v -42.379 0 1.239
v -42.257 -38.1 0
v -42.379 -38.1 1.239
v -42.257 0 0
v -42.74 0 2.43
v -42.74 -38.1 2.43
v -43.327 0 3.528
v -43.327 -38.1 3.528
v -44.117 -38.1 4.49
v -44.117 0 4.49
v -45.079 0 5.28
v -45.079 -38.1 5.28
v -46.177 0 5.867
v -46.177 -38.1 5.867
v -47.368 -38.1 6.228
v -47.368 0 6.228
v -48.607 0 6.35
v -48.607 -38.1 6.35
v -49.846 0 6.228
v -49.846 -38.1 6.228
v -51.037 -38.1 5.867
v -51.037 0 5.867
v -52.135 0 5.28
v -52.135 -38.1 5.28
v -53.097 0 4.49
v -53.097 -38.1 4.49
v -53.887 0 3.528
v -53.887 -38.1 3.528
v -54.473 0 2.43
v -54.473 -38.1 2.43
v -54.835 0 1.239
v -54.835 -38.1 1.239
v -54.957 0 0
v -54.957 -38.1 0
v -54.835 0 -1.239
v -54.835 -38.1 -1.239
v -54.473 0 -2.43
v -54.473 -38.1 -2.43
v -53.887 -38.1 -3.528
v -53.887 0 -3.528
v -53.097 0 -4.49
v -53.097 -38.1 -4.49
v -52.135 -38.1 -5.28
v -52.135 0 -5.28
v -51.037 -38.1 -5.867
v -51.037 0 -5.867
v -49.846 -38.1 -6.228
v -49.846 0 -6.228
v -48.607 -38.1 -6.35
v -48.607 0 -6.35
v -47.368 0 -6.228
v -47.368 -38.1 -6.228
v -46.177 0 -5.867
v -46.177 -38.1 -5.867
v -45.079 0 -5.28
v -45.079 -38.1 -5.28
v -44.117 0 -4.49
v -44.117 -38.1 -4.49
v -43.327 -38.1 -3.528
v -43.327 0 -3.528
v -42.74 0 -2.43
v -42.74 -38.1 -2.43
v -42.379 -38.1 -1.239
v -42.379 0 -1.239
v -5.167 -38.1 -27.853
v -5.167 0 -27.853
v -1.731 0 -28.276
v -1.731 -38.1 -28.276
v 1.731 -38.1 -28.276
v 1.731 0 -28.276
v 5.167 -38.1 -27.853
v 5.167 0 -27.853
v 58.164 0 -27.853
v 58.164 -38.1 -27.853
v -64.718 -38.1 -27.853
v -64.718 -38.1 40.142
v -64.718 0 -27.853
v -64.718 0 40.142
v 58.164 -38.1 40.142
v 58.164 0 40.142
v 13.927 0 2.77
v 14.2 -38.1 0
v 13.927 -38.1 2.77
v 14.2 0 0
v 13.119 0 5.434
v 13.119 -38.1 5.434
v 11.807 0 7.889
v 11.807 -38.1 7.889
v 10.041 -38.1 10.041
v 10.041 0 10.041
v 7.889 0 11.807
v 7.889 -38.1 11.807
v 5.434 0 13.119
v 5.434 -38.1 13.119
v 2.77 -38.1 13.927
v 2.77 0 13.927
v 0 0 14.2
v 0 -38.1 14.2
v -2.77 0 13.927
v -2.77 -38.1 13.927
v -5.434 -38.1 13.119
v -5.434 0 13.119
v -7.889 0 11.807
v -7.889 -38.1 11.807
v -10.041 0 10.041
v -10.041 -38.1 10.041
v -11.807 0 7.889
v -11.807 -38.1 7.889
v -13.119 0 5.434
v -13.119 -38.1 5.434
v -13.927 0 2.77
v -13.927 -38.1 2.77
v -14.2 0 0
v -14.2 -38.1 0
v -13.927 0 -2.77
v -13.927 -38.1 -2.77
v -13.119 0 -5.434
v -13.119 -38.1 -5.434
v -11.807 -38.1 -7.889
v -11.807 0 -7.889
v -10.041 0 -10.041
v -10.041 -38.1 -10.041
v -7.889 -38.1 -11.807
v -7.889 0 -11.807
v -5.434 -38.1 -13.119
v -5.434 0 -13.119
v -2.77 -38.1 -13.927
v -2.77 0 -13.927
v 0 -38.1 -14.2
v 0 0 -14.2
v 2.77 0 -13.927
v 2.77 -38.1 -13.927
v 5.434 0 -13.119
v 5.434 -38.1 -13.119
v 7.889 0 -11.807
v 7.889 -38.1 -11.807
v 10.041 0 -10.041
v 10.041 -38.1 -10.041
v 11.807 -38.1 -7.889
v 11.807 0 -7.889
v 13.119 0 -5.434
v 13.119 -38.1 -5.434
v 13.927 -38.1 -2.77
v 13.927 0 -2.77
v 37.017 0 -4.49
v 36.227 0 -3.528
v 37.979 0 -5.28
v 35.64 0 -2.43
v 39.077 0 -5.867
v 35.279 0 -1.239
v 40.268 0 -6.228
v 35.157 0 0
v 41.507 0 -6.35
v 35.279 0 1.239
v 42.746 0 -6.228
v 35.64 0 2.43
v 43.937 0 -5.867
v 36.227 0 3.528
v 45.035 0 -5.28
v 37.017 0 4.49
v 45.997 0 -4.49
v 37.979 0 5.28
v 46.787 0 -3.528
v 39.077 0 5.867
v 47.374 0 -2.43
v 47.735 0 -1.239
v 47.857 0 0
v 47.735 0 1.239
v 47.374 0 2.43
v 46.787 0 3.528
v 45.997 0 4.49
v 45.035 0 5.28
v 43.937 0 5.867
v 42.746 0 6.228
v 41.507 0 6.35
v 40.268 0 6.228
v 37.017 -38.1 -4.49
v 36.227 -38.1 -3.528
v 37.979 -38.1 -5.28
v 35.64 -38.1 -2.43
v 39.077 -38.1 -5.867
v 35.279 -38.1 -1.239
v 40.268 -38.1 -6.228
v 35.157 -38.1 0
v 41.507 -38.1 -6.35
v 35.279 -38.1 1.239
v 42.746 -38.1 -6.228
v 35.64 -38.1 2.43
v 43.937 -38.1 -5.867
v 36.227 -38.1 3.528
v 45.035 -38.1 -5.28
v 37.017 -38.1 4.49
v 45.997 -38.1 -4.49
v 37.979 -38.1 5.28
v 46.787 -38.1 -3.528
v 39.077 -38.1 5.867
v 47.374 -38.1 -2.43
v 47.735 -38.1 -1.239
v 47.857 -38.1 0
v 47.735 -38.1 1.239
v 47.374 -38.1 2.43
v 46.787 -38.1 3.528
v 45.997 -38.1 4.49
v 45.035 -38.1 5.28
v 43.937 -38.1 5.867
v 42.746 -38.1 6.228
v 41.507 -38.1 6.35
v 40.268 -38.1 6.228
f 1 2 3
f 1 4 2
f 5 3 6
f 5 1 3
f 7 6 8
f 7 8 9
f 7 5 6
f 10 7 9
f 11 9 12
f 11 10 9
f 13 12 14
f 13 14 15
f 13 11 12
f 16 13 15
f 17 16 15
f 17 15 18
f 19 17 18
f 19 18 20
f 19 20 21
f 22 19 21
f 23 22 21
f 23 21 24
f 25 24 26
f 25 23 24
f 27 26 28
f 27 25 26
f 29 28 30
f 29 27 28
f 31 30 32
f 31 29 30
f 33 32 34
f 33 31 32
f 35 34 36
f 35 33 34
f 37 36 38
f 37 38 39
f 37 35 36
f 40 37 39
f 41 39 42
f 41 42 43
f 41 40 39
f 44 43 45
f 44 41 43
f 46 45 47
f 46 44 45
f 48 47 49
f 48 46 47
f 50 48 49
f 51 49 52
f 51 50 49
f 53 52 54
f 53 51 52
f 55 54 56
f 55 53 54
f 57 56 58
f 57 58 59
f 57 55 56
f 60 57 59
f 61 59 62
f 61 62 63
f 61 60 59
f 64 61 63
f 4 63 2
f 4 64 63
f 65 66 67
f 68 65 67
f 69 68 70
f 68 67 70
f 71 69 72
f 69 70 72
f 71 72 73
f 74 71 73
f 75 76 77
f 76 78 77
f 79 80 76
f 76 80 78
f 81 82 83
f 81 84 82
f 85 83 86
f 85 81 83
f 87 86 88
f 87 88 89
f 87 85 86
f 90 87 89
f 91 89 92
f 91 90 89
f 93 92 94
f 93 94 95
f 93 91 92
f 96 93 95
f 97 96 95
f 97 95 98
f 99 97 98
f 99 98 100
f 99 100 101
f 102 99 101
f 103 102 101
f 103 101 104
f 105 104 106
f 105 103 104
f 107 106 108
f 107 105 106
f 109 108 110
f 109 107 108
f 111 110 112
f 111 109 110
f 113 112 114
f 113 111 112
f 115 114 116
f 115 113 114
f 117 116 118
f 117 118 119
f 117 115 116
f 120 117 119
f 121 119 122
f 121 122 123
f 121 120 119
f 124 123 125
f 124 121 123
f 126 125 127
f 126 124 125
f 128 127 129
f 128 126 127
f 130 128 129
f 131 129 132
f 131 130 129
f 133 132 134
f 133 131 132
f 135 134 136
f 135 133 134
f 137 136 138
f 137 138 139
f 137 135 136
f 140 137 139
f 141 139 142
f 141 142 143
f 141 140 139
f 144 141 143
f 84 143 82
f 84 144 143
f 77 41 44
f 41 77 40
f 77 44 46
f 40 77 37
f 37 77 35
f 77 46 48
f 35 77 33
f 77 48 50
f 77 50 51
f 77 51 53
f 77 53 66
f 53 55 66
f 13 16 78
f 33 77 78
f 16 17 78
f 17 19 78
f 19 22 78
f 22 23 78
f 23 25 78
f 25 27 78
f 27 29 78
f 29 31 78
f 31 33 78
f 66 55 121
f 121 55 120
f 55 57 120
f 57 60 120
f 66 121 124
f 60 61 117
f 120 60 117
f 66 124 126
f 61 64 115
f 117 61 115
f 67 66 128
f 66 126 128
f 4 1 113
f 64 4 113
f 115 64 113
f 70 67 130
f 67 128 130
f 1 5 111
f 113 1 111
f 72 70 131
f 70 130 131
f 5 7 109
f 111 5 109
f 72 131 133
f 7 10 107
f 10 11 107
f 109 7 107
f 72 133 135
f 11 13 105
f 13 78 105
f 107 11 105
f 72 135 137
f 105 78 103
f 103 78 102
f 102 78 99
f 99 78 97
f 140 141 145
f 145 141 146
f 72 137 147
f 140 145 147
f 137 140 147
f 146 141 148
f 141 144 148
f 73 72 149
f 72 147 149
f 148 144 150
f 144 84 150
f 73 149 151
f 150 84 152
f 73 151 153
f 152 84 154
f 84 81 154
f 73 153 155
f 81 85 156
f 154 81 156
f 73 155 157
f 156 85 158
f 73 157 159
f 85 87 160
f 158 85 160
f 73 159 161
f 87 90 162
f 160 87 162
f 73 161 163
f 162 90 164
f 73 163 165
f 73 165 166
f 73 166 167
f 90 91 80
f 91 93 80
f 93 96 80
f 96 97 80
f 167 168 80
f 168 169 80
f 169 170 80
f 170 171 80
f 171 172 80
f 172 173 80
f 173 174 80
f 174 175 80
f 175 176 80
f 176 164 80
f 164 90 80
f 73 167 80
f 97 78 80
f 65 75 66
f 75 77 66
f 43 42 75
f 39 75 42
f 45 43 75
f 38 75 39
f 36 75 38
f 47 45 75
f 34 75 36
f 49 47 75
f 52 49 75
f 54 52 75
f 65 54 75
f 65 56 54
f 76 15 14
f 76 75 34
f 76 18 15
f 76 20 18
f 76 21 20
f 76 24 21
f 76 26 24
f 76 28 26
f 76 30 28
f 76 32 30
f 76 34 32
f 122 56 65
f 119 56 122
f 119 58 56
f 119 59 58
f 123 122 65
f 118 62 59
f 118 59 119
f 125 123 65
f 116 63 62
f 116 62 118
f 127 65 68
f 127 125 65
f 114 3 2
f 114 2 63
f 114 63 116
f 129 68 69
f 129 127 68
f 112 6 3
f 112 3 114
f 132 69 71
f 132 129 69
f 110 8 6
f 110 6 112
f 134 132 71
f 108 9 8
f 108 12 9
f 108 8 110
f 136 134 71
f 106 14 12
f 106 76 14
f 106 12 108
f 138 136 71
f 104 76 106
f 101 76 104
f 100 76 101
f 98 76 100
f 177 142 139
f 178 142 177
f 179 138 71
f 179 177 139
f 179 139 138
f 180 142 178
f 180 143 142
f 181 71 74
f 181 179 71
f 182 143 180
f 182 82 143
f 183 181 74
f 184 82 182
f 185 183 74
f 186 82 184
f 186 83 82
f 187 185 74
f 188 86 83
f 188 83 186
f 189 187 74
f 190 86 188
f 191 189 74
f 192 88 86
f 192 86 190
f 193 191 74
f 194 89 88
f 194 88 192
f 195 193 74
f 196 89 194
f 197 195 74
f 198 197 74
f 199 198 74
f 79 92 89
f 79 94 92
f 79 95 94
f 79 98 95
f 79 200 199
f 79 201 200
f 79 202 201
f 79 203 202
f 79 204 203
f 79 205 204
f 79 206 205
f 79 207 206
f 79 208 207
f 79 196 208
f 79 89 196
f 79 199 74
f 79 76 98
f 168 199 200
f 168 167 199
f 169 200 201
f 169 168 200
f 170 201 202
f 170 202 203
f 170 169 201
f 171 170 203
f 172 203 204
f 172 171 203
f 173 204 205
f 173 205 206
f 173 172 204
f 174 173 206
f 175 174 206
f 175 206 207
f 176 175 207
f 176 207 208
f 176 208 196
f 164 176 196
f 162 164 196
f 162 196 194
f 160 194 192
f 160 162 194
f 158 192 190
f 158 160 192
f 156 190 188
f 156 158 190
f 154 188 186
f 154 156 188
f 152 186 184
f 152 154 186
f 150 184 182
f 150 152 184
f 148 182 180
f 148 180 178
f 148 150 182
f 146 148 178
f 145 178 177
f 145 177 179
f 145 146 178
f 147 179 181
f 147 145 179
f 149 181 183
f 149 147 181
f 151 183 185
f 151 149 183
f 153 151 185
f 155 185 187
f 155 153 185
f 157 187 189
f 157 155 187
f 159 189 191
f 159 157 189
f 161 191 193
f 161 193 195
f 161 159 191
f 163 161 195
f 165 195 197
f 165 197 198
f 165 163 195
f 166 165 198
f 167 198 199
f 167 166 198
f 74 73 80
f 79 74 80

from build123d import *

# Parameters (mm, degrees)
F0_R     = 14.1997272149
F0_R_2   = 6.35
F2_DEPTH = 12.7
F3_DEPTH = 25.4


# Not quite as in the source:
# - the program builds the solid bodies; features that only make, move or delete a surface that nothing else refers to are left out


with BuildPart() as f2:
    # F0 (on Front) → F2 (new body)
    with BuildSketch(Plane.XZ):
        with BuildLine():
            ThreePointArc((5.1667592351, -27.8533101082), (21.7815136707, -18.1126460571), (28.3284712785, 0))
            ThreePointArc((28.3284712785, 0), (-18.1126460571, 21.7815136707), (-5.1667592351, -27.8533101082))
            Line((-5.1667592351, -27.8533101082), (5.1667592351, -27.8533101082))
        make_face()
        Circle(F0_R, mode=Mode.SUBTRACT)
        with BuildLine():
            ThreePointArc((-5.1667592351, -27.8533101082), (-18.1126460571, 21.7815136707), (28.3284712785, 0))
            ThreePointArc((28.3284712785, 0), (21.7815136707, -18.1126460571), (5.1667592351, -27.8533101082))
            Line((5.1667592351, -27.8533101082), (58.1642687321, -27.8533101082))
            Line((58.1642687321, -27.8533101082), (58.1642687321, 40.1415377855))
            Line((58.1642687321, 40.1415377855), (-64.7179856896, 40.1415377855))
            Line((-64.7179856896, 40.1415377855), (-64.7179856896, -27.8533101082))
            Line((-64.7179856896, -27.8533101082), (-5.1667592351, -27.8533101082))
        make_face()
        with Locations((-48.6067570746, 0)):
            Circle(F0_R_2, mode=Mode.SUBTRACT)
        with Locations((41.5068976581, 0)):
            Circle(F0_R_2, mode=Mode.SUBTRACT)
        with BuildLine():
            Line((5.1667592351, -27.8533101082), (-5.1667592351, -27.8533101082))
            ThreePointArc((-5.1667592351, -27.8533101082), (0, -28.3284712785), (5.1667592351, -27.8533101082))
        make_face()
    extrude(amount=F2_DEPTH)

    # F3 (add): a face of the model
    f3_faces = [f2.faces().sort_by_distance(p)[0] for p in [
        (56.7575636957, -12.7, 6.1441138387),
    ]]
    extrude(f3_faces, amount=F3_DEPTH)


solid = f2.part
